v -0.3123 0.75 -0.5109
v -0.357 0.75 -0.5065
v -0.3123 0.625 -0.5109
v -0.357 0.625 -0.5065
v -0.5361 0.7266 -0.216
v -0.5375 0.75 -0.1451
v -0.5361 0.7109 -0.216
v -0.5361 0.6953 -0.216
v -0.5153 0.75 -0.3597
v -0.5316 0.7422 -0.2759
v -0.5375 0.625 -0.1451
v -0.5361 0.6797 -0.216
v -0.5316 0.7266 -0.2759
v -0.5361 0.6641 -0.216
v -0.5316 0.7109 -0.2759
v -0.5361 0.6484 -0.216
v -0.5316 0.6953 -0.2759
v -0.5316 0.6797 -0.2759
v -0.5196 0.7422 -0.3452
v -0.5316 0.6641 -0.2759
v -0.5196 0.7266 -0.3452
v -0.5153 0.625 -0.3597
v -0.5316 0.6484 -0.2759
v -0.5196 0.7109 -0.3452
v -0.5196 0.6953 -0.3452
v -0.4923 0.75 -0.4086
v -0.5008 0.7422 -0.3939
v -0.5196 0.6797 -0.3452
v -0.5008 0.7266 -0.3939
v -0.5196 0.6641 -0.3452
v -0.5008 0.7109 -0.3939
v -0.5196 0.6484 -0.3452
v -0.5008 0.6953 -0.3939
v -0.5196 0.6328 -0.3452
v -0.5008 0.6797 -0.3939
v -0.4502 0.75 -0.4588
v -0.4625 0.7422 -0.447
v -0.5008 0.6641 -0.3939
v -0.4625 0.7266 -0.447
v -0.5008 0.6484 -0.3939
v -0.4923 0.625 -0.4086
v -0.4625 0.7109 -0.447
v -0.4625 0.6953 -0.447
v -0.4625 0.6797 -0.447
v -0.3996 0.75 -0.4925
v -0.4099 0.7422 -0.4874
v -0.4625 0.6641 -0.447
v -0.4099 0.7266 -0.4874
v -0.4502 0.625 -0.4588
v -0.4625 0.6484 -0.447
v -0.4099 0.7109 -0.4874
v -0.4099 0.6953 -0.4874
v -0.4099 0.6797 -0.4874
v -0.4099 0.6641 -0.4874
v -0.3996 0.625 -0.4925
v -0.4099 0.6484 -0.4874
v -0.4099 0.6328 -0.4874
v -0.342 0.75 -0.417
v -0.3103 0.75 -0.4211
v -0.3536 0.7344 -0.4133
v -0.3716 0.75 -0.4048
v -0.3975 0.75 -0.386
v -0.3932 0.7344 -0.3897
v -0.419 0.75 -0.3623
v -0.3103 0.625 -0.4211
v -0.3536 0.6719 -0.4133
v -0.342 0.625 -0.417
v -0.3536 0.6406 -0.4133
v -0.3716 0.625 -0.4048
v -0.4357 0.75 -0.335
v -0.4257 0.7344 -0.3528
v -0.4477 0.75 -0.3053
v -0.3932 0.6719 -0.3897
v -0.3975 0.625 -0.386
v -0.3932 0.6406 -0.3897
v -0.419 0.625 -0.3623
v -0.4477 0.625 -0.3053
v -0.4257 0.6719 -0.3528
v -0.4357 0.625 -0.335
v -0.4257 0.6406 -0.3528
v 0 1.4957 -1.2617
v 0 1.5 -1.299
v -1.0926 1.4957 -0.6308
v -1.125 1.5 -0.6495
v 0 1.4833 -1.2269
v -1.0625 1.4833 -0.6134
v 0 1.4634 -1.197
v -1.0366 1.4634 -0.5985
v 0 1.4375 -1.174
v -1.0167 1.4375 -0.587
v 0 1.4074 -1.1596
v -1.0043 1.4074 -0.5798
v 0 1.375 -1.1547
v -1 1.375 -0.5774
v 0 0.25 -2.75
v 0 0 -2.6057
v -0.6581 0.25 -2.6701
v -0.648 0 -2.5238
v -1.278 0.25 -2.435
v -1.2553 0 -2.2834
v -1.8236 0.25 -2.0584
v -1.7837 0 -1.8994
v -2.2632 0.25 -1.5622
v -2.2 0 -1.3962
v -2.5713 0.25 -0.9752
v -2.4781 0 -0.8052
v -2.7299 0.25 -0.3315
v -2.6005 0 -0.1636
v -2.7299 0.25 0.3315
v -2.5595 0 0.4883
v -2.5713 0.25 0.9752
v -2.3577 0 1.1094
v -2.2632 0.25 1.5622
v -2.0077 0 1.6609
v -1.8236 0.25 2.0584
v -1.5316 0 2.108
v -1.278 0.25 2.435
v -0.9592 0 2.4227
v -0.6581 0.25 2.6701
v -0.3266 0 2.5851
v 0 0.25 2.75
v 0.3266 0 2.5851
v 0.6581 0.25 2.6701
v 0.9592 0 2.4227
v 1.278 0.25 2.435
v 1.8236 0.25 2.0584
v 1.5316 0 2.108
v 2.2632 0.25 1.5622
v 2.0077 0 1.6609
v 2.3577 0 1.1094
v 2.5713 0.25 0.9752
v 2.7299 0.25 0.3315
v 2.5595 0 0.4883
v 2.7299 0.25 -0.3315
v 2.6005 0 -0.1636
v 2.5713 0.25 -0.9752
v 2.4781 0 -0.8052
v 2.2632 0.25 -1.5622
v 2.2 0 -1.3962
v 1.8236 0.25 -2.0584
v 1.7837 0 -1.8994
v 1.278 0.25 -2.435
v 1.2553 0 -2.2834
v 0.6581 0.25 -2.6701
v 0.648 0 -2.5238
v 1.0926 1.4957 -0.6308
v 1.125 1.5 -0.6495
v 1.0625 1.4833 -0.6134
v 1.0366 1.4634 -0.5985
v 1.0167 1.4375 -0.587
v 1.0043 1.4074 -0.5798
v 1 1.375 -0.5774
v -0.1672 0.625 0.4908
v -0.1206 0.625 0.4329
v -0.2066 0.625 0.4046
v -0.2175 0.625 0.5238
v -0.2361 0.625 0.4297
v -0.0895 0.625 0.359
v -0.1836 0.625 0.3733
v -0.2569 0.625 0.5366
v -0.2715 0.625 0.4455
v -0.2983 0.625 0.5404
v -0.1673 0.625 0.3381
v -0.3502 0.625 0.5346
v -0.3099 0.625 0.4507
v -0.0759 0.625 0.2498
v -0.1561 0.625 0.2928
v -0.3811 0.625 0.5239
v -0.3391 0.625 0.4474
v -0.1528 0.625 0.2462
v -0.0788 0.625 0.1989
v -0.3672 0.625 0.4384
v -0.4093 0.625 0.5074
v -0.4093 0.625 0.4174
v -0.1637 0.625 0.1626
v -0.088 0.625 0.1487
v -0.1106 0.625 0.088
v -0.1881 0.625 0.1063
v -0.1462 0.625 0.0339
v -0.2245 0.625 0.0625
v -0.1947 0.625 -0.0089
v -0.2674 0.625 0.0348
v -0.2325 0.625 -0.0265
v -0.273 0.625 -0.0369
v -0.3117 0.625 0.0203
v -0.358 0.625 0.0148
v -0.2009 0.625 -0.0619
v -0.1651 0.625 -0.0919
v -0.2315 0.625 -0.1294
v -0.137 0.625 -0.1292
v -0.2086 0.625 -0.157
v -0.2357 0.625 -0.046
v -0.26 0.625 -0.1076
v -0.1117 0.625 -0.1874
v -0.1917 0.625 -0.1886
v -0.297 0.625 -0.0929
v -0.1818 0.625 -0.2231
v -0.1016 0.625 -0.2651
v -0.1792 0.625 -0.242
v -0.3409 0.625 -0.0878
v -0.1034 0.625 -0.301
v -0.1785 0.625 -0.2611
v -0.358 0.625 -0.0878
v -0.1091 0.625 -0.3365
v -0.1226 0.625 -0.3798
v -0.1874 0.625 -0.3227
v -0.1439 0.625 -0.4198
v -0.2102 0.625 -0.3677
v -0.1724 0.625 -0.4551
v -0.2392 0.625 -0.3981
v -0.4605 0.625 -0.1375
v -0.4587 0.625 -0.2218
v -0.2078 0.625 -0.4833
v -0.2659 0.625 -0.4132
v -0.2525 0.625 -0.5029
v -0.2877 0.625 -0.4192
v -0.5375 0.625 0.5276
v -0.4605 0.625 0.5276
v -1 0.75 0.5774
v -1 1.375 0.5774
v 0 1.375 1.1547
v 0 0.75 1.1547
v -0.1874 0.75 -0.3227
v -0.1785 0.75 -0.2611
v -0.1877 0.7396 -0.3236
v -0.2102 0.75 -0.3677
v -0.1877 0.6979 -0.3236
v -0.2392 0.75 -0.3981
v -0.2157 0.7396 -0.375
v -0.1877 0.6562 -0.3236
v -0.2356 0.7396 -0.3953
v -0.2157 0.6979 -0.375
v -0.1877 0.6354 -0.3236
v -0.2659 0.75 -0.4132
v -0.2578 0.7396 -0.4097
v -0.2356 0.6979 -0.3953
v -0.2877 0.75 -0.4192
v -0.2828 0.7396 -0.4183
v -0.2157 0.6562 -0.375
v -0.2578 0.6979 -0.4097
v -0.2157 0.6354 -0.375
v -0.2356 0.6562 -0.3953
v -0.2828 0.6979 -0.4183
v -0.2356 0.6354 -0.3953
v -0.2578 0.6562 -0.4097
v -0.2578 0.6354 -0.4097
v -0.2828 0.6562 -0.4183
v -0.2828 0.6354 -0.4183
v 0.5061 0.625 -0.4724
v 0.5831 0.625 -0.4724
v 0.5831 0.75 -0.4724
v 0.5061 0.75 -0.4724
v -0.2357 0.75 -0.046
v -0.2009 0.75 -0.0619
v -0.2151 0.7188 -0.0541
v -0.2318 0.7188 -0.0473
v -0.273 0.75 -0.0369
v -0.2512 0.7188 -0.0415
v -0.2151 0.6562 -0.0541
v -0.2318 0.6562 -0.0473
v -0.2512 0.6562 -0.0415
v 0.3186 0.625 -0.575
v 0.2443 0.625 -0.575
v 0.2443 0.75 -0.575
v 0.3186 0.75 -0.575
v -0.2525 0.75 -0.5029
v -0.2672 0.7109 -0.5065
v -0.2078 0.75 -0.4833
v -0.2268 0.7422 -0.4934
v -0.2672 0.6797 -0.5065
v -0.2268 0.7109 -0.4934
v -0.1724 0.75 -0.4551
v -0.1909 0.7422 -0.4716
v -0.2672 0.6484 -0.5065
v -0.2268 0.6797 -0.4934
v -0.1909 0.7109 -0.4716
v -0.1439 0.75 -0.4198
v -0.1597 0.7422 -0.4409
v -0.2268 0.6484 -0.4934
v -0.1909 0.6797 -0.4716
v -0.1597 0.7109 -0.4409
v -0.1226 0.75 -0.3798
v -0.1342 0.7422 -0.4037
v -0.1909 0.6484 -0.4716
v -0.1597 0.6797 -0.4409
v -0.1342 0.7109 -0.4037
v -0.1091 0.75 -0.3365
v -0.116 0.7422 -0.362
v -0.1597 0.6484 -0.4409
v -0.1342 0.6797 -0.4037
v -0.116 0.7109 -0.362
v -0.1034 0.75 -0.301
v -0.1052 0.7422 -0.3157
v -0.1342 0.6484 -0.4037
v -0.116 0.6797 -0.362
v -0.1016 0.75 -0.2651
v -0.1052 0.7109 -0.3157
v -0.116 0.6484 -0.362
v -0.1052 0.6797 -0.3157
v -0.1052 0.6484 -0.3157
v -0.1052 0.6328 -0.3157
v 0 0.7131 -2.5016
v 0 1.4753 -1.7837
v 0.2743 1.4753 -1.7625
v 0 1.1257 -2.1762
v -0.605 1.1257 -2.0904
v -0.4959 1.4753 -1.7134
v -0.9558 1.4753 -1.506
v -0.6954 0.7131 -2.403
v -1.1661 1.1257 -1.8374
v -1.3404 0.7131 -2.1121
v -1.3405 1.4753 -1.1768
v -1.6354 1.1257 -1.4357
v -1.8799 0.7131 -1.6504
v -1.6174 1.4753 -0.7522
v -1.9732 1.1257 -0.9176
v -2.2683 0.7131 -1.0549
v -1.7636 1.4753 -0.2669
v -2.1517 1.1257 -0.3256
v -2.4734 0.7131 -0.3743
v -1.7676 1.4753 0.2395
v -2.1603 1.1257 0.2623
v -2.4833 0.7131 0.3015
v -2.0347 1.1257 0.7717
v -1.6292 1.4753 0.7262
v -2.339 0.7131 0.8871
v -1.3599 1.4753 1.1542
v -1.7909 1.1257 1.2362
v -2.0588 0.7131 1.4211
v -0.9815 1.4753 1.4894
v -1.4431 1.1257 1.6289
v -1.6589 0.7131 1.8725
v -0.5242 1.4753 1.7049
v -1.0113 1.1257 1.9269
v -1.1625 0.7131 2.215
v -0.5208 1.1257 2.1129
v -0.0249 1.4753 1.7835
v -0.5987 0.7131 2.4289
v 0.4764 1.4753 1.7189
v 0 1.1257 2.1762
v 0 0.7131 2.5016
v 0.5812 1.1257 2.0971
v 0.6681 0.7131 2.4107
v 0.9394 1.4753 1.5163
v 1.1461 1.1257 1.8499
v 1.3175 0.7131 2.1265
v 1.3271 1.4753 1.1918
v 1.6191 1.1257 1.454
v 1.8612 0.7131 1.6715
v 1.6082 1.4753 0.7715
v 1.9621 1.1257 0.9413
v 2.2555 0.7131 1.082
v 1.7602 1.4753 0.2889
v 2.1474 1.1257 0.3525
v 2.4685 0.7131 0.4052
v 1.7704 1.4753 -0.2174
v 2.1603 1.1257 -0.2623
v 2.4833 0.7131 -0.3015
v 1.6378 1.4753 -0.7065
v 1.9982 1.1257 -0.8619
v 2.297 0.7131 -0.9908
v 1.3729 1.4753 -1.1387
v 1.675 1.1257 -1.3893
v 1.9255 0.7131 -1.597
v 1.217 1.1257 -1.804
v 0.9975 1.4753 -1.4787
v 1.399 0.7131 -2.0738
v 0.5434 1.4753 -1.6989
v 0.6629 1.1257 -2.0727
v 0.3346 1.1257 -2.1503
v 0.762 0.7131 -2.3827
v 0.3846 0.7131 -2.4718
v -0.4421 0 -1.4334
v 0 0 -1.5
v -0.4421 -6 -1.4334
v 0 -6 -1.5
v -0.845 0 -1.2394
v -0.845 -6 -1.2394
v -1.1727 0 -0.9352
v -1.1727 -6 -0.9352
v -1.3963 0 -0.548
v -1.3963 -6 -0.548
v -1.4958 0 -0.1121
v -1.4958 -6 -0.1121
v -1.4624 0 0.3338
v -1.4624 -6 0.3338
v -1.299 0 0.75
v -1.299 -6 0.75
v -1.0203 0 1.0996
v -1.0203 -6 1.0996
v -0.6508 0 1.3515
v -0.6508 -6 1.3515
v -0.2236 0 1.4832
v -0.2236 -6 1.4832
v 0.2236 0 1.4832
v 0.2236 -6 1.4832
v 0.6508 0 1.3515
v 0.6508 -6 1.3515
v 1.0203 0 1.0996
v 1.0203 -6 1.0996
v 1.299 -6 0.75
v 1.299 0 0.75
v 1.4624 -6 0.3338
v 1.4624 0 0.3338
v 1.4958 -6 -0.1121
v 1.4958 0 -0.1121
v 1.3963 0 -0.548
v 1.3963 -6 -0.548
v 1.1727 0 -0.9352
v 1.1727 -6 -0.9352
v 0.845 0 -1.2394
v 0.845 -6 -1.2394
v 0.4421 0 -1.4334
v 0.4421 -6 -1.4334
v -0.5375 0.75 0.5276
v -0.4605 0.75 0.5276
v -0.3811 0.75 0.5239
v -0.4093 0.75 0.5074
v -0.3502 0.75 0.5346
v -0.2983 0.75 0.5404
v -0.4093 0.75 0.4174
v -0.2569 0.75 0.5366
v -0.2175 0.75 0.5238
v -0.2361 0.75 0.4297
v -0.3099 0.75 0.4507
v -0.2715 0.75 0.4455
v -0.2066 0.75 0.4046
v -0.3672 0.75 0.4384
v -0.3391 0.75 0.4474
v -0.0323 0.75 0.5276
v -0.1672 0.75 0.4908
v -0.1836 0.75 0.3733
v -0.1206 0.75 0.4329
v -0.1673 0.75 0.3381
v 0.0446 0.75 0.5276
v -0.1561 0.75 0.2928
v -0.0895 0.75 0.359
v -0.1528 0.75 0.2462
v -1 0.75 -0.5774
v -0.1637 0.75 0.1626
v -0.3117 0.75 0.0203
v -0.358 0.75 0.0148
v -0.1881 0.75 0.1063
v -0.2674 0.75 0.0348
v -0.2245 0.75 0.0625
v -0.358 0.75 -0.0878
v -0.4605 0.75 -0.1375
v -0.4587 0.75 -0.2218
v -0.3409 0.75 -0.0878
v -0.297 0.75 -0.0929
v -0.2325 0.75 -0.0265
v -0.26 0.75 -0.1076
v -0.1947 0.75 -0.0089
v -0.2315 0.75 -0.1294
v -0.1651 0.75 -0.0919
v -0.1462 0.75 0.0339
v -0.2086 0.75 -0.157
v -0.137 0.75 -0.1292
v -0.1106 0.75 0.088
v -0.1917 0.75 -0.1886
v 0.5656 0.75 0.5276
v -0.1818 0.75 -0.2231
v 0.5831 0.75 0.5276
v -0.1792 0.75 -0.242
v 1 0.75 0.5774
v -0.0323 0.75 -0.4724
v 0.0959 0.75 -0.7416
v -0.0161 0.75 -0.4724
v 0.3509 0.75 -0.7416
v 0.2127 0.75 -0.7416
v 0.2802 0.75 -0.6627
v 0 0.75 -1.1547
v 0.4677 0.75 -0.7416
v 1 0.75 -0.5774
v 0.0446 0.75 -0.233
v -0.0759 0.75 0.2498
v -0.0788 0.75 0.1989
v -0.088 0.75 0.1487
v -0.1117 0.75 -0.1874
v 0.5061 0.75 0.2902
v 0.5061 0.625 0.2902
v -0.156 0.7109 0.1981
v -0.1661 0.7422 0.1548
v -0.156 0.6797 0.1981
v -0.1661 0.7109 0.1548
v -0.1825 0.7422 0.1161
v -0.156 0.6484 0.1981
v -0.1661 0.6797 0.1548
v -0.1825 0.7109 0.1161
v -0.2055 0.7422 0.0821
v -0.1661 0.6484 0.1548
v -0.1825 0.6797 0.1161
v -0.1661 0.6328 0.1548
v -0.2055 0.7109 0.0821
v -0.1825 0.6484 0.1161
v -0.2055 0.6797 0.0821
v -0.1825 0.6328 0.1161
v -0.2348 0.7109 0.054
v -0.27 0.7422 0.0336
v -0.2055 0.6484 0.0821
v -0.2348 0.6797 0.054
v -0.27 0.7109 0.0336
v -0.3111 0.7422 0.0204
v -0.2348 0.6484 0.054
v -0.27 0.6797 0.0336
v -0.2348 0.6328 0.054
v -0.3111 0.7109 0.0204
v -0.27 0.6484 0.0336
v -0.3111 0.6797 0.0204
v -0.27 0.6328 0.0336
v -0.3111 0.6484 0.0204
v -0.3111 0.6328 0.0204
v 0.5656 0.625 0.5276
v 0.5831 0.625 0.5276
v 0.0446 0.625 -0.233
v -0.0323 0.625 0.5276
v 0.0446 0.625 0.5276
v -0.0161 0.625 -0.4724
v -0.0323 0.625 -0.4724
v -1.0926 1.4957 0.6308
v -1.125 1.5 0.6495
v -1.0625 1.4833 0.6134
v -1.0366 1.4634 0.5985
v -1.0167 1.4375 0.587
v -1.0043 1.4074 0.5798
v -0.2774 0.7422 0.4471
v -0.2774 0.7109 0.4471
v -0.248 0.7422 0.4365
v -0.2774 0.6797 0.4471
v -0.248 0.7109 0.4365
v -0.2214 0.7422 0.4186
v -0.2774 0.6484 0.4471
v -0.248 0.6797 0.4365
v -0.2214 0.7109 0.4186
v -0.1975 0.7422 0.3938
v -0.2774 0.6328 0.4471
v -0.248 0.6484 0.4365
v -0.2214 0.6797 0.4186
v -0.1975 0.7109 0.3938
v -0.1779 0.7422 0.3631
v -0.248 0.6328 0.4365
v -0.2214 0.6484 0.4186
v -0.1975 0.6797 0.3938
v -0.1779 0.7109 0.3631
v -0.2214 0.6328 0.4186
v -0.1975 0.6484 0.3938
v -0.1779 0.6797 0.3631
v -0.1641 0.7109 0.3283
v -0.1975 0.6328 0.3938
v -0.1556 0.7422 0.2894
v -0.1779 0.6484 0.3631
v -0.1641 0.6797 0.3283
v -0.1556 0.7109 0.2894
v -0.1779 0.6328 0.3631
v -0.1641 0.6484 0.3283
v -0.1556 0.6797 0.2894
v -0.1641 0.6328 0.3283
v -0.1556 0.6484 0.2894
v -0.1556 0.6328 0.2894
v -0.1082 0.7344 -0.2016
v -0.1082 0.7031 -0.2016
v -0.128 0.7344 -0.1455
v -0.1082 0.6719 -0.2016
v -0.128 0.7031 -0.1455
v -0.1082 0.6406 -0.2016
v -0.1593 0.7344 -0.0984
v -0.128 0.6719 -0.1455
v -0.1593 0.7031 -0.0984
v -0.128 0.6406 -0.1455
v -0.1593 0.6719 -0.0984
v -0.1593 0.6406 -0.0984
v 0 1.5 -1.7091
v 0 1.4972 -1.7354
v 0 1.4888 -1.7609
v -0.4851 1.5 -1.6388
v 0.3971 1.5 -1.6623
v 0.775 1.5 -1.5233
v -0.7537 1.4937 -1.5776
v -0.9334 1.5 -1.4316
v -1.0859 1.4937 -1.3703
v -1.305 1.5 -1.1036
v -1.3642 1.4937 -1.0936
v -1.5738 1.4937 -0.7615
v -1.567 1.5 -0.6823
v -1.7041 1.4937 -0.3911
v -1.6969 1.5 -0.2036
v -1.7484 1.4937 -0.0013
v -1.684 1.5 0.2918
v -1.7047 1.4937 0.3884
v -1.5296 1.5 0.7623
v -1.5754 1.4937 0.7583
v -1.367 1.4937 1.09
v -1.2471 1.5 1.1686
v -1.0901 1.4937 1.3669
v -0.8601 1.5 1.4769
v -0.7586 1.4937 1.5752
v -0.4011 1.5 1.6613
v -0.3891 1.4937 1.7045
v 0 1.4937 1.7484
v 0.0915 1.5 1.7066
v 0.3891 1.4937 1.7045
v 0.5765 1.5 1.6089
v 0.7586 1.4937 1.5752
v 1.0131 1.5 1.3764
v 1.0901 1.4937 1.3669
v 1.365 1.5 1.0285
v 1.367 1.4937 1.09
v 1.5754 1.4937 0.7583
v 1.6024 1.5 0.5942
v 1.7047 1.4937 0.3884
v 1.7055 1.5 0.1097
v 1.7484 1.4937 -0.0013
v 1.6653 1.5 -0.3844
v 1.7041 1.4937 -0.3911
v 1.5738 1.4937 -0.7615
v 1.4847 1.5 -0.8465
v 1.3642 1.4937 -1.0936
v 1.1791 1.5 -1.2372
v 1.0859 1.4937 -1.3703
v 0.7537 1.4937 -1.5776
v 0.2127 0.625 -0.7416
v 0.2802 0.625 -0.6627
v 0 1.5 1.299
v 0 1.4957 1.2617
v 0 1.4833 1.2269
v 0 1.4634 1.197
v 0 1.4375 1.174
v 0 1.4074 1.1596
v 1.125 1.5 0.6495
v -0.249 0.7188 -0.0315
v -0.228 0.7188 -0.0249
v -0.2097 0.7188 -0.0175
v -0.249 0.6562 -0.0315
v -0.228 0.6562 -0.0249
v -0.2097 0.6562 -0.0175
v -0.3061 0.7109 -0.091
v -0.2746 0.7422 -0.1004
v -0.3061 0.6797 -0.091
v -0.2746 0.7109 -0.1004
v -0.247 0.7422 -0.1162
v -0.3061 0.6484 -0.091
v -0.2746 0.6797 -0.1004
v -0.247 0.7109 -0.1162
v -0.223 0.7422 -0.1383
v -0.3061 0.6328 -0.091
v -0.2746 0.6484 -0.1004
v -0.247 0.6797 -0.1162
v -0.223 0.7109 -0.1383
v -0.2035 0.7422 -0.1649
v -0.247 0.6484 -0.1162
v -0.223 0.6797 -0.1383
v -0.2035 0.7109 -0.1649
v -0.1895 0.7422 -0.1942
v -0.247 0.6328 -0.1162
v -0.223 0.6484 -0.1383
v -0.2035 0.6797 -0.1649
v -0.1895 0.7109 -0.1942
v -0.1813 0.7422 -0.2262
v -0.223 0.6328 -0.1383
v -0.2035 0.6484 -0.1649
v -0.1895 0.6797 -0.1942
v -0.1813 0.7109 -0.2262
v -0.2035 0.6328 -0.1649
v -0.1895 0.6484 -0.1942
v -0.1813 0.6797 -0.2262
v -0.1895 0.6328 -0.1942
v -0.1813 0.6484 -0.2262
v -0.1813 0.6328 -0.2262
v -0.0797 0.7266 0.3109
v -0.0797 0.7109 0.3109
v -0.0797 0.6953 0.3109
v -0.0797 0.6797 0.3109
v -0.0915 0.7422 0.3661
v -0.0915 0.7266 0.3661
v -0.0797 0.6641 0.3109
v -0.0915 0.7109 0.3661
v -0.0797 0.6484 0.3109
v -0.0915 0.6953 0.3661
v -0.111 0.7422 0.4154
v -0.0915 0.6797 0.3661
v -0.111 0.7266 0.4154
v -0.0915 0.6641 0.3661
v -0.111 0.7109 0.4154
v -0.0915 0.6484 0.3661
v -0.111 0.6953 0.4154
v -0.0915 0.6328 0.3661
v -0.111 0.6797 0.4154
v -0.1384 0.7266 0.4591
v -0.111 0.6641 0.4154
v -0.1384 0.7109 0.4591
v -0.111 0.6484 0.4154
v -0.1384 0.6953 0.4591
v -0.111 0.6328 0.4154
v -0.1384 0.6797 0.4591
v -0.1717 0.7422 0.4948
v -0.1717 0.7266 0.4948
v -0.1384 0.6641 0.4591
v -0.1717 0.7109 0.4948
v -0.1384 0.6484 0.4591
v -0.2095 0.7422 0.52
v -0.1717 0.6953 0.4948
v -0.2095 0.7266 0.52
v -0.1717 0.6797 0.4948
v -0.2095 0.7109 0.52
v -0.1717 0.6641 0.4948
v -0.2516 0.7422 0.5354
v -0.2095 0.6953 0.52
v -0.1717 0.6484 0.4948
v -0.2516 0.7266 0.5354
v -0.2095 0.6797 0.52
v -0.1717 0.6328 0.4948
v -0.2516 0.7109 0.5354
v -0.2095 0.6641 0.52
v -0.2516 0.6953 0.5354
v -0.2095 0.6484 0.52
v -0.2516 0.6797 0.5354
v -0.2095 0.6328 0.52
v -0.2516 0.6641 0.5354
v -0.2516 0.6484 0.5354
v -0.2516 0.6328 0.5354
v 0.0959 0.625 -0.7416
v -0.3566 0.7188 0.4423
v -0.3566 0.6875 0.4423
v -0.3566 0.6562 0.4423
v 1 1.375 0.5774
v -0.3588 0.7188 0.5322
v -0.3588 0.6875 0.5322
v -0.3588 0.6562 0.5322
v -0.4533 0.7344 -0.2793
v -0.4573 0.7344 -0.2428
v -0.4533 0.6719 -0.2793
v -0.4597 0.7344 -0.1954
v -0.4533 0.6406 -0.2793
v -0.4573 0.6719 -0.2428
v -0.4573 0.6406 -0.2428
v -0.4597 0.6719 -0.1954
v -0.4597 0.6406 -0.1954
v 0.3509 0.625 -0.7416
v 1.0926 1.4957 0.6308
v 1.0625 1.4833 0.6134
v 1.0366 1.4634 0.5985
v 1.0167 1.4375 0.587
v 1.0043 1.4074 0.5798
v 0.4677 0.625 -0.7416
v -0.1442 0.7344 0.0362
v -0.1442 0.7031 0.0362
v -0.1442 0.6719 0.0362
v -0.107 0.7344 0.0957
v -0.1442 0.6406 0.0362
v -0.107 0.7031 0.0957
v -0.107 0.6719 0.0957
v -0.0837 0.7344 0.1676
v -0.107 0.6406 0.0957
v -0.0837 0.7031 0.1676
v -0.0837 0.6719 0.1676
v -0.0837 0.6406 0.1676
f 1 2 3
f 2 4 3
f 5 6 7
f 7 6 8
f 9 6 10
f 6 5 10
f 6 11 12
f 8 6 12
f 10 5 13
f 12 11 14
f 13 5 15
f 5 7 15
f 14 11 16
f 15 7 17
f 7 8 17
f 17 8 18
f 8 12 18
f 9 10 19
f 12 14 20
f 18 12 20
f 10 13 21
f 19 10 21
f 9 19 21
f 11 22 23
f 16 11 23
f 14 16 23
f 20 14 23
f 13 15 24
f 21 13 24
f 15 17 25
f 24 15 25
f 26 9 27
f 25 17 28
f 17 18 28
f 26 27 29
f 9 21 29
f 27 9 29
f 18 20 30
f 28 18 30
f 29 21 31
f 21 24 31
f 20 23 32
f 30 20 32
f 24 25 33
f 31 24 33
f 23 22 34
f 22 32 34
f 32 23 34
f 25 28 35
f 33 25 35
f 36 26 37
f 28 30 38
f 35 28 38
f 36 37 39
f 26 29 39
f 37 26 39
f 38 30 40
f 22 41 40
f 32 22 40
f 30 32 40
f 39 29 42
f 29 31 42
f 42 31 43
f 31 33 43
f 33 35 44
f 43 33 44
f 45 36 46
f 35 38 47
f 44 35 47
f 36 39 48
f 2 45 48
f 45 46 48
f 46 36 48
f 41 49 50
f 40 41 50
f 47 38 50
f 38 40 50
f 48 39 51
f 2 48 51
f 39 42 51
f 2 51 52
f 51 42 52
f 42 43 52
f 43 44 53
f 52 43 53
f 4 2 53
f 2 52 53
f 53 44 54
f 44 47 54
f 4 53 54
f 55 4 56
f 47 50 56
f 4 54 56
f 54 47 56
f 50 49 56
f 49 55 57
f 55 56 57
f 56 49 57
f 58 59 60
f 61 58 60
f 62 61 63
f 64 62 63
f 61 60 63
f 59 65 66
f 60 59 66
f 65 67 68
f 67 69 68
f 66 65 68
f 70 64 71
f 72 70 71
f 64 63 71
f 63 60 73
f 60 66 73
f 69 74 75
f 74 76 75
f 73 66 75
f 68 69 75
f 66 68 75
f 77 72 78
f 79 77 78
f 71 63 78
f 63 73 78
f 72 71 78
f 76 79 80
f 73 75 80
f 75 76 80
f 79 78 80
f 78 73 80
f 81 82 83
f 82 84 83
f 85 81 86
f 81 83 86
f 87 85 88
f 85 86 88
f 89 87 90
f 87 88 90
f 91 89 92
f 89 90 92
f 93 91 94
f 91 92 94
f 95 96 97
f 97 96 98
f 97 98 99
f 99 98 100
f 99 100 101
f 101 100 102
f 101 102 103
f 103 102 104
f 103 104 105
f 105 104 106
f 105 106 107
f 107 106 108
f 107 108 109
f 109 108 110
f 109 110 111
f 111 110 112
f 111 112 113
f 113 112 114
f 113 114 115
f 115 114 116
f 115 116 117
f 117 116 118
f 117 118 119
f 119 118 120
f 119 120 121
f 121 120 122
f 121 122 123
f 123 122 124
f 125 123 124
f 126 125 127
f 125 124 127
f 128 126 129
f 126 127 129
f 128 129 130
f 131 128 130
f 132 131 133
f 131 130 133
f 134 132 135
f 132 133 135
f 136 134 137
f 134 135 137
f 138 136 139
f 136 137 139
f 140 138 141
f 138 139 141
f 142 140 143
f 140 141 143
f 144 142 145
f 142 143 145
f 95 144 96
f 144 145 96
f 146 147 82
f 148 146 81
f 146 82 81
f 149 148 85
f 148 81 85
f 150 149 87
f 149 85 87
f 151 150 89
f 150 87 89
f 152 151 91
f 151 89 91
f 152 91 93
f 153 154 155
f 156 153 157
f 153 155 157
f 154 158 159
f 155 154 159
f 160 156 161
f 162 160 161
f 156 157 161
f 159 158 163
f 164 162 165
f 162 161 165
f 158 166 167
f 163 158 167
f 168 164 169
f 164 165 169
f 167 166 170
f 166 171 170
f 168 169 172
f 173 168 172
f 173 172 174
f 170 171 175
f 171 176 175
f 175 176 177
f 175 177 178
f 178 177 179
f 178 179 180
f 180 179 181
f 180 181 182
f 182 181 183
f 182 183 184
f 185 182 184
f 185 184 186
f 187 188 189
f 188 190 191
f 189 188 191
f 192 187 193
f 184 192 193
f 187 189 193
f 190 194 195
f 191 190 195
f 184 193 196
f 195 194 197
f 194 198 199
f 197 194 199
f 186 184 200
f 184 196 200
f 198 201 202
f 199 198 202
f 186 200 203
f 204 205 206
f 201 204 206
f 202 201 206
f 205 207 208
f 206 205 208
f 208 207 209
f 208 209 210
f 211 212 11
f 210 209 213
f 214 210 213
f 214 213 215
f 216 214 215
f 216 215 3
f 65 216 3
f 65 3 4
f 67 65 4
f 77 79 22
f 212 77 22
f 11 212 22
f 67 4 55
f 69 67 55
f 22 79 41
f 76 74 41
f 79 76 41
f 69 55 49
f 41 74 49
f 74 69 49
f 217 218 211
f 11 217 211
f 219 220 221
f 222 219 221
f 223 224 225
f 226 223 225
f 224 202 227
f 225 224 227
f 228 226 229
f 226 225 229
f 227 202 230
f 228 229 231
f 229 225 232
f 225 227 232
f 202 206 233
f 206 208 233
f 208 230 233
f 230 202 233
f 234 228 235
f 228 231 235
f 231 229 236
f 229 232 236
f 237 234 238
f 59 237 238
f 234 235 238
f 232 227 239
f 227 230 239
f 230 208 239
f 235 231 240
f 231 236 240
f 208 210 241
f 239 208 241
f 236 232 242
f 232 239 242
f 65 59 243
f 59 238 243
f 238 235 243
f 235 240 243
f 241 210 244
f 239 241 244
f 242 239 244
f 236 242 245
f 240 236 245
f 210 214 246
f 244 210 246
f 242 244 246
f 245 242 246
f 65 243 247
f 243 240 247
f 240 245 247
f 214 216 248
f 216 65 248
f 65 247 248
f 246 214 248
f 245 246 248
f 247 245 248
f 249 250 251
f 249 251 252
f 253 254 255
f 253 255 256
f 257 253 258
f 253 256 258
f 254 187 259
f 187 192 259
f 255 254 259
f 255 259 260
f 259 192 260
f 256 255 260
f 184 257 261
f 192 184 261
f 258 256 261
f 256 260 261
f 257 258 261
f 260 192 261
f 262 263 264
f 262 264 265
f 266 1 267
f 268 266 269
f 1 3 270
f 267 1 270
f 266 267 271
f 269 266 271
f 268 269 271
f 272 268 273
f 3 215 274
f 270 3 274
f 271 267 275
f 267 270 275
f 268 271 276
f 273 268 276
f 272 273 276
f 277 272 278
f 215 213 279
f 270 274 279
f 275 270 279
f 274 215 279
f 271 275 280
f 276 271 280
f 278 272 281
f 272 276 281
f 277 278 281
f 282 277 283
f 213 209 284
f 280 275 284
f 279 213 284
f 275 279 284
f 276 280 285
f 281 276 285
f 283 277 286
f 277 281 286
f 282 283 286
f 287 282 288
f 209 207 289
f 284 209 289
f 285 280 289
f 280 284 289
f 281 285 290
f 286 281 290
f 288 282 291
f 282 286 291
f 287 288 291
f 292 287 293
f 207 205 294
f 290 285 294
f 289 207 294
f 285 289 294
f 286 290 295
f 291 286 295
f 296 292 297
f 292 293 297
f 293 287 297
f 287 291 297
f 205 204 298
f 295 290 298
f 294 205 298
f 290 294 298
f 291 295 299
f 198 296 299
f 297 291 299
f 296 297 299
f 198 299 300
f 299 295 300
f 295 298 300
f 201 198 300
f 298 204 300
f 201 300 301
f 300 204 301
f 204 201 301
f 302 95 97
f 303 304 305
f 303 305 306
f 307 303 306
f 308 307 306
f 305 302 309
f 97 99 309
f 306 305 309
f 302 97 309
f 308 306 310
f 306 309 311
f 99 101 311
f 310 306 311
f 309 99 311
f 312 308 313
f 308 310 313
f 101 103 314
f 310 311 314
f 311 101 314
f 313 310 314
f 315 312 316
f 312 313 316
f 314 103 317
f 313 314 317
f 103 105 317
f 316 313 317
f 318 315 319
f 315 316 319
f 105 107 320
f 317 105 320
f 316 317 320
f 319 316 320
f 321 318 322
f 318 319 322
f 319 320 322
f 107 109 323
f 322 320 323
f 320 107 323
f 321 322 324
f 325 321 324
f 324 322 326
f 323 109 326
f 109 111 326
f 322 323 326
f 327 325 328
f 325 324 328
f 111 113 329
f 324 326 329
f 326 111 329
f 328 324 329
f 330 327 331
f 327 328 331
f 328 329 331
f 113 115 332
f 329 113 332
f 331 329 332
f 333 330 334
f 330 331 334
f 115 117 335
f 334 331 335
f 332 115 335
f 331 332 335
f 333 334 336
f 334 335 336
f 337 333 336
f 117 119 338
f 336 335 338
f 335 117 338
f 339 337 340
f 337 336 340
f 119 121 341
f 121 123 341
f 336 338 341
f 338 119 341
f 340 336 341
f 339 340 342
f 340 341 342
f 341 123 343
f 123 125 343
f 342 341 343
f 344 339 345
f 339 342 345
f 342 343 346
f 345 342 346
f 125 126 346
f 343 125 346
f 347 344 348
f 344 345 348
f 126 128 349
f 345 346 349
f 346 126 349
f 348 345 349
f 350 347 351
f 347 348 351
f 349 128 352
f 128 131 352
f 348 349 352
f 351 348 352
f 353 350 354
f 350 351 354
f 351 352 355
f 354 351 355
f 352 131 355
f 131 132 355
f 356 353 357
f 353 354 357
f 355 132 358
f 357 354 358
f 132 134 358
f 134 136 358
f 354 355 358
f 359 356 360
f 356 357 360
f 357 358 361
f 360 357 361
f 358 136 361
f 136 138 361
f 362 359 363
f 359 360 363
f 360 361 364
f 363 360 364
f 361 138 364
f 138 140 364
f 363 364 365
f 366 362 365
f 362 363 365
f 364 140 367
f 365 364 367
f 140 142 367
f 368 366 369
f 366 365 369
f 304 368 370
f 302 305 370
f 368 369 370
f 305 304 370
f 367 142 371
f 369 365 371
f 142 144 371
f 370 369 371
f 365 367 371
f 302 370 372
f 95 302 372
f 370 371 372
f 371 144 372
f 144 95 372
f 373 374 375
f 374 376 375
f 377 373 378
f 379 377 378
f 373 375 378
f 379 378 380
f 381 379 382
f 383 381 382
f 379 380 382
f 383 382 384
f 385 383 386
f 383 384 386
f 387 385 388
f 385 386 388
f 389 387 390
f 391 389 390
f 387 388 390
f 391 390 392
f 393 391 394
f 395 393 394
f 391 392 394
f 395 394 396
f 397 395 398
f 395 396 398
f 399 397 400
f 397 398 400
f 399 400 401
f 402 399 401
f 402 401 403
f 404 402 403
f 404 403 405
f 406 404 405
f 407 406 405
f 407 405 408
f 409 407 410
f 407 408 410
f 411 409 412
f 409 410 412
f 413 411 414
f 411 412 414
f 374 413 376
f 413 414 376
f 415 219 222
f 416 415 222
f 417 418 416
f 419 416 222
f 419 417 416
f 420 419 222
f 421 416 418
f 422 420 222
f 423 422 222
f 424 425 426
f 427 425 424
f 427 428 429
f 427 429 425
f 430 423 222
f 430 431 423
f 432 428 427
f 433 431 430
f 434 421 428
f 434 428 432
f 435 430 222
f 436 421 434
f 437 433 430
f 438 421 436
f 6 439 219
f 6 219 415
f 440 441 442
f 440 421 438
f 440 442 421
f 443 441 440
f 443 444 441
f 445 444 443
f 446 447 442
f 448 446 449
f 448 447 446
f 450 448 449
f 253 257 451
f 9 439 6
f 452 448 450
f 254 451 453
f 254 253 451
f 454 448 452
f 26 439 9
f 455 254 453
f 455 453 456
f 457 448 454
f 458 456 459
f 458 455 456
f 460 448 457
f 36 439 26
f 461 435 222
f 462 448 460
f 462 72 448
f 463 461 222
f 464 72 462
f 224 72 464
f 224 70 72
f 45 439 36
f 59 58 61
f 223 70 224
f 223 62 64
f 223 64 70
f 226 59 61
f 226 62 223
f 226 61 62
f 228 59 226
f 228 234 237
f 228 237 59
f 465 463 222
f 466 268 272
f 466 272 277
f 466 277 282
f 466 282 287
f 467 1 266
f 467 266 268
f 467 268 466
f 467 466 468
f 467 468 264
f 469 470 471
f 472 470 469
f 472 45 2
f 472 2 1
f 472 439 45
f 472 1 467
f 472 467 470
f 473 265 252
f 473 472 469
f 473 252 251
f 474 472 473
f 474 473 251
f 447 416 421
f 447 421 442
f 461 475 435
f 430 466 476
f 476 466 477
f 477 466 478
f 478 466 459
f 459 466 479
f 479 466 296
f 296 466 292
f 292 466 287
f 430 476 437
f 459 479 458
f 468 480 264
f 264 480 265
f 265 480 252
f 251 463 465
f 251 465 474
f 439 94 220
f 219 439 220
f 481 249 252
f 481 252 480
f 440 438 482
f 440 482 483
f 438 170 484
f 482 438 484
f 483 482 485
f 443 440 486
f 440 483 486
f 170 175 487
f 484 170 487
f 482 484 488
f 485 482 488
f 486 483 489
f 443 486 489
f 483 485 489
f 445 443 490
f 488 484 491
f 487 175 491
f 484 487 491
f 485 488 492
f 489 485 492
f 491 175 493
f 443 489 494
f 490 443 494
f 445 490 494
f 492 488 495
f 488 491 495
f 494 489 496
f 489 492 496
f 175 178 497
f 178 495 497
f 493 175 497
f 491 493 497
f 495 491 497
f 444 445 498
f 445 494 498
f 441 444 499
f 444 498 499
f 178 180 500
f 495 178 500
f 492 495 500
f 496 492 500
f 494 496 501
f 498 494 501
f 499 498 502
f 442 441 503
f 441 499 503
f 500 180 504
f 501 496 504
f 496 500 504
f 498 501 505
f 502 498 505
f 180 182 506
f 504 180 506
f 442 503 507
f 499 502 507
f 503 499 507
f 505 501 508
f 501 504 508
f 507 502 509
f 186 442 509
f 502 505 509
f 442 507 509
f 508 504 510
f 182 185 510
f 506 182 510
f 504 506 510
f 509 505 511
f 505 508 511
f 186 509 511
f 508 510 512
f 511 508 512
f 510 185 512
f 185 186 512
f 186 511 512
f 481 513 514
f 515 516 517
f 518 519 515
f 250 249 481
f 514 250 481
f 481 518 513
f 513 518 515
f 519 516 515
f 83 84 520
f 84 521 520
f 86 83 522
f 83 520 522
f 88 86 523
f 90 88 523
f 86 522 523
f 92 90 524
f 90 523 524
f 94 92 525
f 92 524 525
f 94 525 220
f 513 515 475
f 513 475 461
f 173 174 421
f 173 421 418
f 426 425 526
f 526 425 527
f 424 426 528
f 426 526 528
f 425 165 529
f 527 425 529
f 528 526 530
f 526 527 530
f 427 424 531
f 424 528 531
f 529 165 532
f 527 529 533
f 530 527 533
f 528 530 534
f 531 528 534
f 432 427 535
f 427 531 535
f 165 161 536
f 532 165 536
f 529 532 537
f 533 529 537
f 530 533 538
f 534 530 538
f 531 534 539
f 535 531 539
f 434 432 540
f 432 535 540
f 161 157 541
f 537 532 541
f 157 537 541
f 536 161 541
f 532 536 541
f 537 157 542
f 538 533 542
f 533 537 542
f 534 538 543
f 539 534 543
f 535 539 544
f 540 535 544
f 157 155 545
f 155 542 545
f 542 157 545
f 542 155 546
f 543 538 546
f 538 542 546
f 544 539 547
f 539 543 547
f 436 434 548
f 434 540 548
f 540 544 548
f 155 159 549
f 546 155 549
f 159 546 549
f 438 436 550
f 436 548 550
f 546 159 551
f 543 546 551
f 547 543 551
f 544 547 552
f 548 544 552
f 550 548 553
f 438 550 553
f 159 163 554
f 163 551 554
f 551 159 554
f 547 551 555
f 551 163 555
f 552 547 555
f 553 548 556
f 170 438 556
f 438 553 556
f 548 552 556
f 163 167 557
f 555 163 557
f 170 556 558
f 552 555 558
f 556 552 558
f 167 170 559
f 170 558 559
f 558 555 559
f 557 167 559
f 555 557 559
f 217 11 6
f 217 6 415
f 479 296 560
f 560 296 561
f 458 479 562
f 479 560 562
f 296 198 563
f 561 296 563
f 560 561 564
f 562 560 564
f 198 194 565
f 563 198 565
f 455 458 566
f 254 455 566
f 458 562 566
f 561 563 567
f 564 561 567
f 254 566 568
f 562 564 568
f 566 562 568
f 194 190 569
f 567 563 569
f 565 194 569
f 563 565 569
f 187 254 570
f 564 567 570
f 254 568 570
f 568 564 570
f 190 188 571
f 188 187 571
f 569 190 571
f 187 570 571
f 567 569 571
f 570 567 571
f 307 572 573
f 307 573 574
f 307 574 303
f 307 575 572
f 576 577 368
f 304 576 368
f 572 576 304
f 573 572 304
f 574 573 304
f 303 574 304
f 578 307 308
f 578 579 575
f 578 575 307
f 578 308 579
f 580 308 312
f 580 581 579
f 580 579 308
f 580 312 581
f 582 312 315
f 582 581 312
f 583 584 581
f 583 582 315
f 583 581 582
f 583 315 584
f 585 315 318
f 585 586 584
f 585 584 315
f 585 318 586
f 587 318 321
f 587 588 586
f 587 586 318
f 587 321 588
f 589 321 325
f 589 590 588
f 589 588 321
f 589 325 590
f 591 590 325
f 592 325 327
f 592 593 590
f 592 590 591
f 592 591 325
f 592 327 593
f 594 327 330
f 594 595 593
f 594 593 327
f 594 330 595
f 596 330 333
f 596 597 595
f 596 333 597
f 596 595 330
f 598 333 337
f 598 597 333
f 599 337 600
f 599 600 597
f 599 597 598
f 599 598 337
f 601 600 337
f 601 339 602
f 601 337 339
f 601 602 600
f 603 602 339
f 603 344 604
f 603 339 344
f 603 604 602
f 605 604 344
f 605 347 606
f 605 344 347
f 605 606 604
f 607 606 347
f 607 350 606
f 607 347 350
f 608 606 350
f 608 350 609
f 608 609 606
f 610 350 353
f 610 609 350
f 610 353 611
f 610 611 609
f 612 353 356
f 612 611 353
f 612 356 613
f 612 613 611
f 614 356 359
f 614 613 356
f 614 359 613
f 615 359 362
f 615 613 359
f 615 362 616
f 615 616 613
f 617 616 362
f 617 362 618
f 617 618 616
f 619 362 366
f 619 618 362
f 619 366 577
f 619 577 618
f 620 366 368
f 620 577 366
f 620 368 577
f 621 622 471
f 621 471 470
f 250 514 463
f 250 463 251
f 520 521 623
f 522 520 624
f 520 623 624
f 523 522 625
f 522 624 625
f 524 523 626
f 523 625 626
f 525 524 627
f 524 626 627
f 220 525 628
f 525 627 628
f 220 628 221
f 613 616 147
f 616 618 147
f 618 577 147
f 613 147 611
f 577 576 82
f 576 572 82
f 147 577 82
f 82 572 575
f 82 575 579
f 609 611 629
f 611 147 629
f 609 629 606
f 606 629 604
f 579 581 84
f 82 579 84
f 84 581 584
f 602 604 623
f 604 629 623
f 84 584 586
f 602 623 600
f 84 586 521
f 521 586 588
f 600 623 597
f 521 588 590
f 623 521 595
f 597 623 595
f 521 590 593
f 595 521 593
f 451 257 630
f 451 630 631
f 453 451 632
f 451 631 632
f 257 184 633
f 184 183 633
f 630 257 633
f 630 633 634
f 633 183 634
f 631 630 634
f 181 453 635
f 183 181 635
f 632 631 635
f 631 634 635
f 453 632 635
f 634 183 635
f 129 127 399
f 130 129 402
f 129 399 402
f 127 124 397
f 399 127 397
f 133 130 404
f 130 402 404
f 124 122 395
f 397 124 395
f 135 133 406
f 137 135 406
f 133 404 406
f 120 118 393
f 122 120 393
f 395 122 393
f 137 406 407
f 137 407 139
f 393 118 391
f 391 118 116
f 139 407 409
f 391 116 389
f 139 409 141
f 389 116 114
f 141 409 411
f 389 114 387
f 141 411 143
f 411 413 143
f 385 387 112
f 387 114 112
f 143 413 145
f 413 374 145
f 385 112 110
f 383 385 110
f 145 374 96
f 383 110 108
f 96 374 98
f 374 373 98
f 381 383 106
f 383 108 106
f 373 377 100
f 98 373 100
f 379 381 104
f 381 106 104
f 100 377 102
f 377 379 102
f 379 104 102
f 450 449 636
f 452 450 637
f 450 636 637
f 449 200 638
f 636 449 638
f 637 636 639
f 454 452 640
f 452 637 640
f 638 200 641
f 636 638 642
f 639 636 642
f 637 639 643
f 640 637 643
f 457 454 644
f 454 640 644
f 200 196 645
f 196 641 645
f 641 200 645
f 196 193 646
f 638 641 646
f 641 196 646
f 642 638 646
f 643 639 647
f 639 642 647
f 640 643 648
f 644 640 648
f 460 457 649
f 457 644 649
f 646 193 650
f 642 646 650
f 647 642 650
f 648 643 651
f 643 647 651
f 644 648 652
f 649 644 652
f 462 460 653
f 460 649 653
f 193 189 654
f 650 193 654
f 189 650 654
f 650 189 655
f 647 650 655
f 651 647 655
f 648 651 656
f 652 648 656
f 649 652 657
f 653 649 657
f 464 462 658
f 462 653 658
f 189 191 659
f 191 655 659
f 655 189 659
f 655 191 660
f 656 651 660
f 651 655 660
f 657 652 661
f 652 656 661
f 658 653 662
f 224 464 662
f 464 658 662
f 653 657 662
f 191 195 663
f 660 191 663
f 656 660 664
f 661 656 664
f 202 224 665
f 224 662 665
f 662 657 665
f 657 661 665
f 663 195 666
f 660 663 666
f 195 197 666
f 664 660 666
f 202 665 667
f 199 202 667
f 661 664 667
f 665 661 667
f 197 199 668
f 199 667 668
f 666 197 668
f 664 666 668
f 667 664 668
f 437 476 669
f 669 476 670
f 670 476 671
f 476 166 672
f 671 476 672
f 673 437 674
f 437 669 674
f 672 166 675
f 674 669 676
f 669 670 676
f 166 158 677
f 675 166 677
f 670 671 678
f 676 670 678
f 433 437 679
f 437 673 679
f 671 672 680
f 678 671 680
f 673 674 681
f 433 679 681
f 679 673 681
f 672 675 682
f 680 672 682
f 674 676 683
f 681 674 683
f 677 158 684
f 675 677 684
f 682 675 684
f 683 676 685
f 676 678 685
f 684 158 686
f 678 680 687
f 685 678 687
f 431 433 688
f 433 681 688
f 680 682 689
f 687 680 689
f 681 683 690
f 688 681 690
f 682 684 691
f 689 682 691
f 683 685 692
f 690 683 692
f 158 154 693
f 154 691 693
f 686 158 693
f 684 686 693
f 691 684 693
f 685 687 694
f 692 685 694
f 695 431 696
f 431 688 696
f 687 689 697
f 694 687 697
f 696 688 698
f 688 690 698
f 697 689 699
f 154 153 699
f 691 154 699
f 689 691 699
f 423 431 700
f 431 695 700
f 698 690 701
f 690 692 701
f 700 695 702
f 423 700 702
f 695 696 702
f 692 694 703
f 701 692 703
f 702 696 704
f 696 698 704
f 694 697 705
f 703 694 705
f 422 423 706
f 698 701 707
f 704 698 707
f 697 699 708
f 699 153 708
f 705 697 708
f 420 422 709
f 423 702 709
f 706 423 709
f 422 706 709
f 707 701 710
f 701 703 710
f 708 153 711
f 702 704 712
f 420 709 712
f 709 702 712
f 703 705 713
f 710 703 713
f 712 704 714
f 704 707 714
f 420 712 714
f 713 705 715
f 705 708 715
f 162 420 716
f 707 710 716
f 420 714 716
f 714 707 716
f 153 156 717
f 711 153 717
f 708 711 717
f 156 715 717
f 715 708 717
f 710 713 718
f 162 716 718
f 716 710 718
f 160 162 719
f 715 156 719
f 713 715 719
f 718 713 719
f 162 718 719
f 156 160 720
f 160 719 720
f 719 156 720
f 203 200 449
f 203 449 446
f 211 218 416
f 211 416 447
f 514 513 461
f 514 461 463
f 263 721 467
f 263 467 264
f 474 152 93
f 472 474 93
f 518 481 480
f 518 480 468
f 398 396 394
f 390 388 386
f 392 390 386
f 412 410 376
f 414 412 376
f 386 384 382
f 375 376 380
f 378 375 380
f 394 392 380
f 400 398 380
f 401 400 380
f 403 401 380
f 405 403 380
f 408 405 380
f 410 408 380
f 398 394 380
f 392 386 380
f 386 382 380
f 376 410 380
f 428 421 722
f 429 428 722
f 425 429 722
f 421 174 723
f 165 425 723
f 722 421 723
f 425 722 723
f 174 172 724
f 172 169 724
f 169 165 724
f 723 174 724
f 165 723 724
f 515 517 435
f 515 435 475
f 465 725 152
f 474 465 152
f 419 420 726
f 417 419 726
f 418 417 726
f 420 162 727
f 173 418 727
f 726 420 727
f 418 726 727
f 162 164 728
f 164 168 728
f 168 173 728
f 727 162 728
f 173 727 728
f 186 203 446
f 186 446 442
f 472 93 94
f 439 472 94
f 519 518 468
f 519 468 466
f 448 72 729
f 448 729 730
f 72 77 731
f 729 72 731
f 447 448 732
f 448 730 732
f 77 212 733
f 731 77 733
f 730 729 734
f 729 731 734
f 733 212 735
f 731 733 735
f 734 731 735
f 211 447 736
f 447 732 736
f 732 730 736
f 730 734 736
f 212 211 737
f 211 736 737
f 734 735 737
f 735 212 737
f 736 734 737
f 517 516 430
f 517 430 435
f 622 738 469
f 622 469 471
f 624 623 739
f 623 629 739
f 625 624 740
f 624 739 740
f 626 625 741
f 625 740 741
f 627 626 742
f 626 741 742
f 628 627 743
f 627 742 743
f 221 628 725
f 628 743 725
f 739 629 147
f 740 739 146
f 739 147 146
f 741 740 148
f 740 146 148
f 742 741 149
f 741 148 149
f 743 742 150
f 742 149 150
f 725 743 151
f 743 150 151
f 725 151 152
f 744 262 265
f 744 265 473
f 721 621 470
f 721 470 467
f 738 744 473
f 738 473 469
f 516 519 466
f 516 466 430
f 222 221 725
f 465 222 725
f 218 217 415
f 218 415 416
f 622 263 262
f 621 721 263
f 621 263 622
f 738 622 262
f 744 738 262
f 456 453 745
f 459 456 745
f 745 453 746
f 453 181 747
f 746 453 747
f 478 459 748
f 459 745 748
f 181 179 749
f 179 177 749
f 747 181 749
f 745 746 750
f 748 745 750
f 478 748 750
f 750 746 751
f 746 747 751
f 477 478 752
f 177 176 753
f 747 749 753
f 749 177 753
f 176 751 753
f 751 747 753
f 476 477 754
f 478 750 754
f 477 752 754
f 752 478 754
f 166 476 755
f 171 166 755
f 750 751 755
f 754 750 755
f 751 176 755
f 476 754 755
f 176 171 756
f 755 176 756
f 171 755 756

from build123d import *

# Parameters (mm, degrees)
CUT_EXTRUDE1_DEPTH = 0.75
FILLET1_R          = 0.125
WRAP1_START        = -0.125
WRAP1_DEPTH        = 0.125


# Read off the part's stored shape, not the designer's step: Wrap1
with BuildPart() as part:
    # Sketch1 → Revolve1 (revolve)
    with BuildSketch(Plane(origin=(0, 0, 0), x_dir=(0, 0, -1), z_dir=(1, 0, 0)), mode=Mode.PRIVATE) as revolve1_sk:
        with BuildLine():
            Line((0, 1.5), (-1.75, 1.5))
            ThreePointArc((-1.75, 1.5), (-2.334912942, 0.942930354), (-2.75, 0.25))
            Line((-2.75, 0.25), (-2.605662433, 0))
            Line((-2.605662433, 0), (-1.5, 0))
            Line((-1.5, 0), (-1.5, -6))
            Line((-1.5, -6), (0, -6))
            Line((0, -6), (0, 1.5))
        make_face()
    revolve(revolve1_sk.sketch.rotate(Axis((0, -6, 0), (0, 1, 0)), 180), axis=Axis((0, -6, 0), (0, 1, 0)))

    # Sketch2 → Cut-Extrude1 (cut)
    with BuildSketch(Plane(origin=(0, 1.5, 0), x_dir=(1, 0, 0), z_dir=(0, 1, 0))):
        Polygon((0, 1.154700538), (-1, 0.577350269), (-1, -0.577350269), (0, -1.154700538), (1, -0.577350269), (1, 0.577350269), align=None)
    extrude(amount=-CUT_EXTRUDE1_DEPTH, mode=Mode.SUBTRACT)

    # Fillet1
    fillet1_edges = [part.edges().sort_by_distance(p)[0] for p in [
        (0.5, 1.5, -0.866025404),
        (-0.5, 1.5, -0.866025404),
        (-1, 1.5, 0),
        (-0.5, 1.5, 0.866025404),
        (0.5, 1.5, 0.866025404),
        (1, 1.5, 0),
        (0, 1.5, 1.75),
    ]]
    fillet(fillet1_edges, radius=FILLET1_R)

    # Wrap1 outline → Wrap1 (cut)
    with BuildSketch(Plane(origin=(0, 0.75, 0), x_dir=(1, 0, 0), z_dir=(0, 1, 0)).offset(WRAP1_START)):
        with BuildLine():
            add(Edge.make_bspline(
                [(-0.537455829, 0.145072229), (-0.537366548, 0.15735919), (-0.537194747, 0.181002472), (-0.536236546, 0.215136123), (-0.534510696, 0.246473554), (-0.531857696, 0.275057496), (-0.528751002, 0.300937263), (-0.524861231, 0.324098842), (-0.520025531, 0.344486675), (-0.512963856, 0.367808475), (-0.501673714, 0.39403328), (-0.484042302, 0.422215735), (-0.462961845, 0.447719467), (-0.43819726, 0.469796385), (-0.410438674, 0.48826361), (-0.379753396, 0.501330341), (-0.346770262, 0.509472114), (-0.323962243, 0.510388658), (-0.312295573, 0.510857485)],
                knots=[0, 0, 0, 0, 0.075666503, 0.145601872, 0.210267314, 0.268902852, 0.322354979, 0.370758742, 0.413447068, 0.451298193, 0.520734923, 0.588514213, 0.655379256, 0.723813985, 0.792131248, 0.85973193, 0.928250616, 1, 1, 1, 1], degree=3))
            Line((-0.537455829, 0.145072229), (-0.537455829, -0.527604053))
            Line((-0.537455829, -0.527604053), (-0.460532752, -0.527604053))
            Line((-0.460532752, -0.527604053), (-0.460532752, 0.137460049))
            add(Edge.make_bspline(
                [(-0.447712239, 0.305328639), (-0.448774545, 0.301469619), (-0.451134212, 0.292897693), (-0.453525545, 0.278533298), (-0.455753975, 0.261566558), (-0.457491806, 0.241915402), (-0.458861613, 0.219538201), (-0.459832928, 0.194491685), (-0.460431178, 0.166843342), (-0.460497896, 0.147543183), (-0.460532752, 0.137460049)],
                knots=[0, 0, 0, 0, 0.071102967, 0.157938928, 0.258486703, 0.375288845, 0.508476997, 0.656953648, 0.820779591, 1, 1, 1, 1], degree=3))
            add(Edge.make_bspline(
                [(-0.310292367, 0.421113895), (-0.317674297, 0.420714803), (-0.332400851, 0.419918636), (-0.353965955, 0.413875353), (-0.374511474, 0.403804365), (-0.393760239, 0.390026559), (-0.411220155, 0.372905819), (-0.426330799, 0.352966004), (-0.438683838, 0.330213781), (-0.444651659, 0.313764569), (-0.447712239, 0.305328639)],
                knots=[0, 0, 0, 0, 0.115143072, 0.229704239, 0.346728965, 0.47082069, 0.597615275, 0.727089869, 0.860038825, 1, 1, 1, 1], degree=3))
            add(Edge.make_bspline(
                [(-0.17848147, 0.261057806), (-0.178952566, 0.271974178), (-0.179864172, 0.293098195), (-0.186637459, 0.323530756), (-0.198777604, 0.350930356), (-0.212261145, 0.371485038), (-0.225066026, 0.38586534), (-0.235235588, 0.395399384), (-0.246252738, 0.403200746), (-0.257654824, 0.410013084), (-0.269995595, 0.414921405), (-0.282862679, 0.418632696), (-0.296413152, 0.420560449), (-0.305613195, 0.420927309), (-0.310292367, 0.421113895)],
                knots=[0, 0, 0, 0, 0.141583044, 0.273974039, 0.401600231, 0.528456794, 0.591043942, 0.651122908, 0.708825408, 0.765880537, 0.822988251, 0.880580103, 0.939262648, 1, 1, 1, 1], degree=3))
            add(Edge.make_bspline(
                [(-0.340941406, 0.087780562), (-0.334988303, 0.08792105), (-0.323299062, 0.088196907), (-0.306225523, 0.090764835), (-0.289888322, 0.094368098), (-0.274654087, 0.100137271), (-0.260174408, 0.107124777), (-0.24682212, 0.11601785), (-0.234254323, 0.126336142), (-0.222711003, 0.138095802), (-0.212416341, 0.151054166), (-0.203323514, 0.164708223), (-0.195692258, 0.179095557), (-0.189162431, 0.194099224), (-0.184457799, 0.209936522), (-0.181072867, 0.226359939), (-0.178698712, 0.243427453), (-0.178554801, 0.255106579), (-0.17848147, 0.261057806)],
                knots=[0, 0, 0, 0, 0.067065692, 0.131687113, 0.194317921, 0.255289037, 0.314878218, 0.375218702, 0.435653028, 0.497934511, 0.56059698, 0.621980302, 0.682601877, 0.743985199, 0.806139168, 0.868443394, 0.932963888, 1, 1, 1, 1], degree=3))
            Line((-0.340941406, 0.087780562), (-0.357968649, 0.087780562))
            Line((-0.357968649, 0.087780562), (-0.357968649, -0.014783541))
            add(Edge.make_bspline(
                [(-0.152840444, -0.246153733), (-0.152991921, -0.237935238), (-0.153288163, -0.221862292), (-0.155672785, -0.198335348), (-0.159894598, -0.176034257), (-0.165736265, -0.154867378), (-0.173053307, -0.13483662), (-0.182215246, -0.116043494), (-0.192787882, -0.098300128), (-0.20519576, -0.081953022), (-0.21910276, -0.067000398), (-0.234429011, -0.053697294), (-0.25160782, -0.04265632), (-0.269991613, -0.033131715), (-0.29004854, -0.025867397), (-0.311286964, -0.019869429), (-0.334167811, -0.016416131), (-0.349879854, -0.015338382), (-0.357968649, -0.014783541)],
                knots=[0, 0, 0, 0, 0.070899124, 0.138657723, 0.203740428, 0.266496883, 0.327925022, 0.387445969, 0.44662859, 0.505853257, 0.564143059, 0.622569358, 0.680413321, 0.739931479, 0.800819634, 0.864131594, 0.930052902, 1, 1, 1, 1], degree=3))
            add(Edge.make_bspline(
                [(-0.309891726, -0.450680977), (-0.304334961, -0.450571211), (-0.293413044, -0.450355466), (-0.277514036, -0.447340483), (-0.262286727, -0.442989313), (-0.247781817, -0.436676481), (-0.233907442, -0.428733085), (-0.221051475, -0.418678171), (-0.208664071, -0.407189838), (-0.197187775, -0.393882067), (-0.186871623, -0.37903336), (-0.17755536, -0.363253667), (-0.169907305, -0.346235338), (-0.163848892, -0.328206631), (-0.158625475, -0.30926113), (-0.155449196, -0.289102842), (-0.15305503, -0.26797937), (-0.152912733, -0.253506267), (-0.152840444, -0.246153733)],
                knots=[0, 0, 0, 0, 0.057830355, 0.113666545, 0.168061557, 0.222616608, 0.278122197, 0.334218011, 0.392319921, 0.453992458, 0.516935927, 0.58055674, 0.644719566, 0.710965936, 0.778658745, 0.849251577, 0.923417744, 1, 1, 1, 1], degree=3))
            add(Edge.make_bspline(
                [(-0.409250701, -0.417427771), (-0.40035509, -0.422552084), (-0.383473121, -0.432276934), (-0.357561529, -0.44229785), (-0.333383308, -0.449497533), (-0.317482442, -0.450298576), (-0.309891726, -0.450680977)],
                knots=[0, 0, 0, 0, 0.290177362, 0.550694617, 0.785511707, 1, 1, 1, 1], degree=3))
            Line((-0.409250701, -0.417427771), (-0.409250701, -0.507371682))
            add(Edge.make_bspline(
                [(-0.298273137, -0.540424566), (-0.308861639, -0.540097242), (-0.329301798, -0.539465371), (-0.358664913, -0.532954409), (-0.385682425, -0.522833546), (-0.401463988, -0.512480121), (-0.409250701, -0.507371682)],
                knots=[0, 0, 0, 0, 0.269471748, 0.52019112, 0.763259579, 1, 1, 1, 1], degree=3))
            add(Edge.make_bspline(
                [(-0.075917367, -0.249759502), (-0.076128163, -0.26018073), (-0.076541077, -0.280594276), (-0.079227651, -0.310491914), (-0.084396107, -0.33890103), (-0.091033777, -0.365960134), (-0.09992887, -0.391457717), (-0.110563094, -0.41559927), (-0.123397597, -0.438155636), (-0.137962217, -0.459132621), (-0.153934421, -0.478163377), (-0.171095941, -0.494958486), (-0.189740067, -0.508821331), (-0.209271063, -0.520337979), (-0.2298646, -0.529505832), (-0.251686582, -0.535889962), (-0.274626983, -0.539804561), (-0.290311376, -0.540215808), (-0.298273137, -0.540424566)],
                knots=[0, 0, 0, 0, 0.076485505, 0.149823073, 0.219996399, 0.288217649, 0.354082023, 0.417919027, 0.481558234, 0.544225908, 0.605087621, 0.663657146, 0.720011753, 0.77514507, 0.829777395, 0.884976008, 0.941611157, 1, 1, 1, 1], degree=3))
            add(Edge.make_bspline(
                [(-0.194707432, 0.00885428), (-0.185532098, 0.002246917), (-0.167142487, -0.010995852), (-0.14356067, -0.035865532), (-0.123015599, -0.064046821), (-0.106173919, -0.095826321), (-0.092429948, -0.130510752), (-0.082995533, -0.168026939), (-0.077008082, -0.208034101), (-0.076287996, -0.23558107), (-0.075917367, -0.249759502)],
                knots=[0, 0, 0, 0, 0.114174048, 0.228832702, 0.344903554, 0.466103946, 0.591676048, 0.72144281, 0.856626542, 1, 1, 1, 1], degree=3))
            add(Edge.make_bspline(
                [(-0.273032752, 0.036899152), (-0.264977593, 0.035253476), (-0.249714467, 0.032135208), (-0.228666305, 0.025295577), (-0.210172583, 0.018341569), (-0.199638474, 0.011879289), (-0.194707432, 0.00885428)],
                knots=[0, 0, 0, 0, 0.294434237, 0.557901696, 0.79305271, 1, 1, 1, 1], degree=3))
            add(Edge.make_bspline(
                [(-0.200917367, 0.061939216), (-0.205600715, 0.059219735), (-0.215469689, 0.053489114), (-0.232413767, 0.046806913), (-0.251771921, 0.040993346), (-0.265723651, 0.038306664), (-0.273032752, 0.036899152)],
                knots=[0, 0, 0, 0, 0.211315364, 0.445293882, 0.709397831, 1, 1, 1, 1], degree=3))
            add(Edge.make_bspline(
                [(-0.101558393, 0.265064216), (-0.101829728, 0.254158186), (-0.102360461, 0.23282596), (-0.107582885, 0.201794643), (-0.115635878, 0.172523389), (-0.127393107, 0.145424978), (-0.141807851, 0.120566799), (-0.158666737, 0.09801557), (-0.178511599, 0.078390972), (-0.193428545, 0.067437991), (-0.200917367, 0.061939216)],
                knots=[0, 0, 0, 0, 0.138734507, 0.271365083, 0.399463796, 0.524371928, 0.64626696, 0.764603187, 0.881822663, 1, 1, 1, 1], degree=3))
            add(Edge.make_bspline(
                [(-0.312295573, 0.510857485), (-0.304601721, 0.510709635), (-0.289468193, 0.510418818), (-0.267407867, 0.506806308), (-0.246411552, 0.501505665), (-0.226632783, 0.49383833), (-0.208041676, 0.483900131), (-0.190537128, 0.47184286), (-0.174217748, 0.457507541), (-0.159329374, 0.44106616), (-0.145724285, 0.423136003), (-0.133914037, 0.403846519), (-0.123827558, 0.383480477), (-0.115525112, 0.361982783), (-0.109489008, 0.339238969), (-0.104721569, 0.315513437), (-0.102229905, 0.290624502), (-0.101784813, 0.273682609), (-0.101558393, 0.265064216)],
                knots=[0, 0, 0, 0, 0.063537388, 0.124975739, 0.184284437, 0.242302503, 0.299838056, 0.35817297, 0.417627897, 0.478966986, 0.541230446, 0.60342781, 0.66563497, 0.728883988, 0.793562004, 0.859921094, 0.928741429, 1, 1, 1, 1], degree=3))
        make_face()
        Polygon((0.565629107, -0.527604053), (0.583056992, -0.527604053), (0.583056992, 0.472395947), (0.506133915, 0.472395947), (0.506133915, -0.290224246), (-0.016101662, 0.472395947), (-0.032327624, 0.472395947), (-0.032327624, -0.527604053), (0.044595453, -0.527604053), (0.044595453, 0.233012934), align=None)
        Polygon((0.095877504, 0.741626716), (0.244315004, 0.574960049), (0.318633915, 0.574960049), (0.467672376, 0.741626716), (0.350885517, 0.741626716), (0.280172376, 0.662700434), (0.212664363, 0.741626716), align=None)
    extrude(amount=WRAP1_DEPTH, mode=Mode.SUBTRACT)


solid = part.part
